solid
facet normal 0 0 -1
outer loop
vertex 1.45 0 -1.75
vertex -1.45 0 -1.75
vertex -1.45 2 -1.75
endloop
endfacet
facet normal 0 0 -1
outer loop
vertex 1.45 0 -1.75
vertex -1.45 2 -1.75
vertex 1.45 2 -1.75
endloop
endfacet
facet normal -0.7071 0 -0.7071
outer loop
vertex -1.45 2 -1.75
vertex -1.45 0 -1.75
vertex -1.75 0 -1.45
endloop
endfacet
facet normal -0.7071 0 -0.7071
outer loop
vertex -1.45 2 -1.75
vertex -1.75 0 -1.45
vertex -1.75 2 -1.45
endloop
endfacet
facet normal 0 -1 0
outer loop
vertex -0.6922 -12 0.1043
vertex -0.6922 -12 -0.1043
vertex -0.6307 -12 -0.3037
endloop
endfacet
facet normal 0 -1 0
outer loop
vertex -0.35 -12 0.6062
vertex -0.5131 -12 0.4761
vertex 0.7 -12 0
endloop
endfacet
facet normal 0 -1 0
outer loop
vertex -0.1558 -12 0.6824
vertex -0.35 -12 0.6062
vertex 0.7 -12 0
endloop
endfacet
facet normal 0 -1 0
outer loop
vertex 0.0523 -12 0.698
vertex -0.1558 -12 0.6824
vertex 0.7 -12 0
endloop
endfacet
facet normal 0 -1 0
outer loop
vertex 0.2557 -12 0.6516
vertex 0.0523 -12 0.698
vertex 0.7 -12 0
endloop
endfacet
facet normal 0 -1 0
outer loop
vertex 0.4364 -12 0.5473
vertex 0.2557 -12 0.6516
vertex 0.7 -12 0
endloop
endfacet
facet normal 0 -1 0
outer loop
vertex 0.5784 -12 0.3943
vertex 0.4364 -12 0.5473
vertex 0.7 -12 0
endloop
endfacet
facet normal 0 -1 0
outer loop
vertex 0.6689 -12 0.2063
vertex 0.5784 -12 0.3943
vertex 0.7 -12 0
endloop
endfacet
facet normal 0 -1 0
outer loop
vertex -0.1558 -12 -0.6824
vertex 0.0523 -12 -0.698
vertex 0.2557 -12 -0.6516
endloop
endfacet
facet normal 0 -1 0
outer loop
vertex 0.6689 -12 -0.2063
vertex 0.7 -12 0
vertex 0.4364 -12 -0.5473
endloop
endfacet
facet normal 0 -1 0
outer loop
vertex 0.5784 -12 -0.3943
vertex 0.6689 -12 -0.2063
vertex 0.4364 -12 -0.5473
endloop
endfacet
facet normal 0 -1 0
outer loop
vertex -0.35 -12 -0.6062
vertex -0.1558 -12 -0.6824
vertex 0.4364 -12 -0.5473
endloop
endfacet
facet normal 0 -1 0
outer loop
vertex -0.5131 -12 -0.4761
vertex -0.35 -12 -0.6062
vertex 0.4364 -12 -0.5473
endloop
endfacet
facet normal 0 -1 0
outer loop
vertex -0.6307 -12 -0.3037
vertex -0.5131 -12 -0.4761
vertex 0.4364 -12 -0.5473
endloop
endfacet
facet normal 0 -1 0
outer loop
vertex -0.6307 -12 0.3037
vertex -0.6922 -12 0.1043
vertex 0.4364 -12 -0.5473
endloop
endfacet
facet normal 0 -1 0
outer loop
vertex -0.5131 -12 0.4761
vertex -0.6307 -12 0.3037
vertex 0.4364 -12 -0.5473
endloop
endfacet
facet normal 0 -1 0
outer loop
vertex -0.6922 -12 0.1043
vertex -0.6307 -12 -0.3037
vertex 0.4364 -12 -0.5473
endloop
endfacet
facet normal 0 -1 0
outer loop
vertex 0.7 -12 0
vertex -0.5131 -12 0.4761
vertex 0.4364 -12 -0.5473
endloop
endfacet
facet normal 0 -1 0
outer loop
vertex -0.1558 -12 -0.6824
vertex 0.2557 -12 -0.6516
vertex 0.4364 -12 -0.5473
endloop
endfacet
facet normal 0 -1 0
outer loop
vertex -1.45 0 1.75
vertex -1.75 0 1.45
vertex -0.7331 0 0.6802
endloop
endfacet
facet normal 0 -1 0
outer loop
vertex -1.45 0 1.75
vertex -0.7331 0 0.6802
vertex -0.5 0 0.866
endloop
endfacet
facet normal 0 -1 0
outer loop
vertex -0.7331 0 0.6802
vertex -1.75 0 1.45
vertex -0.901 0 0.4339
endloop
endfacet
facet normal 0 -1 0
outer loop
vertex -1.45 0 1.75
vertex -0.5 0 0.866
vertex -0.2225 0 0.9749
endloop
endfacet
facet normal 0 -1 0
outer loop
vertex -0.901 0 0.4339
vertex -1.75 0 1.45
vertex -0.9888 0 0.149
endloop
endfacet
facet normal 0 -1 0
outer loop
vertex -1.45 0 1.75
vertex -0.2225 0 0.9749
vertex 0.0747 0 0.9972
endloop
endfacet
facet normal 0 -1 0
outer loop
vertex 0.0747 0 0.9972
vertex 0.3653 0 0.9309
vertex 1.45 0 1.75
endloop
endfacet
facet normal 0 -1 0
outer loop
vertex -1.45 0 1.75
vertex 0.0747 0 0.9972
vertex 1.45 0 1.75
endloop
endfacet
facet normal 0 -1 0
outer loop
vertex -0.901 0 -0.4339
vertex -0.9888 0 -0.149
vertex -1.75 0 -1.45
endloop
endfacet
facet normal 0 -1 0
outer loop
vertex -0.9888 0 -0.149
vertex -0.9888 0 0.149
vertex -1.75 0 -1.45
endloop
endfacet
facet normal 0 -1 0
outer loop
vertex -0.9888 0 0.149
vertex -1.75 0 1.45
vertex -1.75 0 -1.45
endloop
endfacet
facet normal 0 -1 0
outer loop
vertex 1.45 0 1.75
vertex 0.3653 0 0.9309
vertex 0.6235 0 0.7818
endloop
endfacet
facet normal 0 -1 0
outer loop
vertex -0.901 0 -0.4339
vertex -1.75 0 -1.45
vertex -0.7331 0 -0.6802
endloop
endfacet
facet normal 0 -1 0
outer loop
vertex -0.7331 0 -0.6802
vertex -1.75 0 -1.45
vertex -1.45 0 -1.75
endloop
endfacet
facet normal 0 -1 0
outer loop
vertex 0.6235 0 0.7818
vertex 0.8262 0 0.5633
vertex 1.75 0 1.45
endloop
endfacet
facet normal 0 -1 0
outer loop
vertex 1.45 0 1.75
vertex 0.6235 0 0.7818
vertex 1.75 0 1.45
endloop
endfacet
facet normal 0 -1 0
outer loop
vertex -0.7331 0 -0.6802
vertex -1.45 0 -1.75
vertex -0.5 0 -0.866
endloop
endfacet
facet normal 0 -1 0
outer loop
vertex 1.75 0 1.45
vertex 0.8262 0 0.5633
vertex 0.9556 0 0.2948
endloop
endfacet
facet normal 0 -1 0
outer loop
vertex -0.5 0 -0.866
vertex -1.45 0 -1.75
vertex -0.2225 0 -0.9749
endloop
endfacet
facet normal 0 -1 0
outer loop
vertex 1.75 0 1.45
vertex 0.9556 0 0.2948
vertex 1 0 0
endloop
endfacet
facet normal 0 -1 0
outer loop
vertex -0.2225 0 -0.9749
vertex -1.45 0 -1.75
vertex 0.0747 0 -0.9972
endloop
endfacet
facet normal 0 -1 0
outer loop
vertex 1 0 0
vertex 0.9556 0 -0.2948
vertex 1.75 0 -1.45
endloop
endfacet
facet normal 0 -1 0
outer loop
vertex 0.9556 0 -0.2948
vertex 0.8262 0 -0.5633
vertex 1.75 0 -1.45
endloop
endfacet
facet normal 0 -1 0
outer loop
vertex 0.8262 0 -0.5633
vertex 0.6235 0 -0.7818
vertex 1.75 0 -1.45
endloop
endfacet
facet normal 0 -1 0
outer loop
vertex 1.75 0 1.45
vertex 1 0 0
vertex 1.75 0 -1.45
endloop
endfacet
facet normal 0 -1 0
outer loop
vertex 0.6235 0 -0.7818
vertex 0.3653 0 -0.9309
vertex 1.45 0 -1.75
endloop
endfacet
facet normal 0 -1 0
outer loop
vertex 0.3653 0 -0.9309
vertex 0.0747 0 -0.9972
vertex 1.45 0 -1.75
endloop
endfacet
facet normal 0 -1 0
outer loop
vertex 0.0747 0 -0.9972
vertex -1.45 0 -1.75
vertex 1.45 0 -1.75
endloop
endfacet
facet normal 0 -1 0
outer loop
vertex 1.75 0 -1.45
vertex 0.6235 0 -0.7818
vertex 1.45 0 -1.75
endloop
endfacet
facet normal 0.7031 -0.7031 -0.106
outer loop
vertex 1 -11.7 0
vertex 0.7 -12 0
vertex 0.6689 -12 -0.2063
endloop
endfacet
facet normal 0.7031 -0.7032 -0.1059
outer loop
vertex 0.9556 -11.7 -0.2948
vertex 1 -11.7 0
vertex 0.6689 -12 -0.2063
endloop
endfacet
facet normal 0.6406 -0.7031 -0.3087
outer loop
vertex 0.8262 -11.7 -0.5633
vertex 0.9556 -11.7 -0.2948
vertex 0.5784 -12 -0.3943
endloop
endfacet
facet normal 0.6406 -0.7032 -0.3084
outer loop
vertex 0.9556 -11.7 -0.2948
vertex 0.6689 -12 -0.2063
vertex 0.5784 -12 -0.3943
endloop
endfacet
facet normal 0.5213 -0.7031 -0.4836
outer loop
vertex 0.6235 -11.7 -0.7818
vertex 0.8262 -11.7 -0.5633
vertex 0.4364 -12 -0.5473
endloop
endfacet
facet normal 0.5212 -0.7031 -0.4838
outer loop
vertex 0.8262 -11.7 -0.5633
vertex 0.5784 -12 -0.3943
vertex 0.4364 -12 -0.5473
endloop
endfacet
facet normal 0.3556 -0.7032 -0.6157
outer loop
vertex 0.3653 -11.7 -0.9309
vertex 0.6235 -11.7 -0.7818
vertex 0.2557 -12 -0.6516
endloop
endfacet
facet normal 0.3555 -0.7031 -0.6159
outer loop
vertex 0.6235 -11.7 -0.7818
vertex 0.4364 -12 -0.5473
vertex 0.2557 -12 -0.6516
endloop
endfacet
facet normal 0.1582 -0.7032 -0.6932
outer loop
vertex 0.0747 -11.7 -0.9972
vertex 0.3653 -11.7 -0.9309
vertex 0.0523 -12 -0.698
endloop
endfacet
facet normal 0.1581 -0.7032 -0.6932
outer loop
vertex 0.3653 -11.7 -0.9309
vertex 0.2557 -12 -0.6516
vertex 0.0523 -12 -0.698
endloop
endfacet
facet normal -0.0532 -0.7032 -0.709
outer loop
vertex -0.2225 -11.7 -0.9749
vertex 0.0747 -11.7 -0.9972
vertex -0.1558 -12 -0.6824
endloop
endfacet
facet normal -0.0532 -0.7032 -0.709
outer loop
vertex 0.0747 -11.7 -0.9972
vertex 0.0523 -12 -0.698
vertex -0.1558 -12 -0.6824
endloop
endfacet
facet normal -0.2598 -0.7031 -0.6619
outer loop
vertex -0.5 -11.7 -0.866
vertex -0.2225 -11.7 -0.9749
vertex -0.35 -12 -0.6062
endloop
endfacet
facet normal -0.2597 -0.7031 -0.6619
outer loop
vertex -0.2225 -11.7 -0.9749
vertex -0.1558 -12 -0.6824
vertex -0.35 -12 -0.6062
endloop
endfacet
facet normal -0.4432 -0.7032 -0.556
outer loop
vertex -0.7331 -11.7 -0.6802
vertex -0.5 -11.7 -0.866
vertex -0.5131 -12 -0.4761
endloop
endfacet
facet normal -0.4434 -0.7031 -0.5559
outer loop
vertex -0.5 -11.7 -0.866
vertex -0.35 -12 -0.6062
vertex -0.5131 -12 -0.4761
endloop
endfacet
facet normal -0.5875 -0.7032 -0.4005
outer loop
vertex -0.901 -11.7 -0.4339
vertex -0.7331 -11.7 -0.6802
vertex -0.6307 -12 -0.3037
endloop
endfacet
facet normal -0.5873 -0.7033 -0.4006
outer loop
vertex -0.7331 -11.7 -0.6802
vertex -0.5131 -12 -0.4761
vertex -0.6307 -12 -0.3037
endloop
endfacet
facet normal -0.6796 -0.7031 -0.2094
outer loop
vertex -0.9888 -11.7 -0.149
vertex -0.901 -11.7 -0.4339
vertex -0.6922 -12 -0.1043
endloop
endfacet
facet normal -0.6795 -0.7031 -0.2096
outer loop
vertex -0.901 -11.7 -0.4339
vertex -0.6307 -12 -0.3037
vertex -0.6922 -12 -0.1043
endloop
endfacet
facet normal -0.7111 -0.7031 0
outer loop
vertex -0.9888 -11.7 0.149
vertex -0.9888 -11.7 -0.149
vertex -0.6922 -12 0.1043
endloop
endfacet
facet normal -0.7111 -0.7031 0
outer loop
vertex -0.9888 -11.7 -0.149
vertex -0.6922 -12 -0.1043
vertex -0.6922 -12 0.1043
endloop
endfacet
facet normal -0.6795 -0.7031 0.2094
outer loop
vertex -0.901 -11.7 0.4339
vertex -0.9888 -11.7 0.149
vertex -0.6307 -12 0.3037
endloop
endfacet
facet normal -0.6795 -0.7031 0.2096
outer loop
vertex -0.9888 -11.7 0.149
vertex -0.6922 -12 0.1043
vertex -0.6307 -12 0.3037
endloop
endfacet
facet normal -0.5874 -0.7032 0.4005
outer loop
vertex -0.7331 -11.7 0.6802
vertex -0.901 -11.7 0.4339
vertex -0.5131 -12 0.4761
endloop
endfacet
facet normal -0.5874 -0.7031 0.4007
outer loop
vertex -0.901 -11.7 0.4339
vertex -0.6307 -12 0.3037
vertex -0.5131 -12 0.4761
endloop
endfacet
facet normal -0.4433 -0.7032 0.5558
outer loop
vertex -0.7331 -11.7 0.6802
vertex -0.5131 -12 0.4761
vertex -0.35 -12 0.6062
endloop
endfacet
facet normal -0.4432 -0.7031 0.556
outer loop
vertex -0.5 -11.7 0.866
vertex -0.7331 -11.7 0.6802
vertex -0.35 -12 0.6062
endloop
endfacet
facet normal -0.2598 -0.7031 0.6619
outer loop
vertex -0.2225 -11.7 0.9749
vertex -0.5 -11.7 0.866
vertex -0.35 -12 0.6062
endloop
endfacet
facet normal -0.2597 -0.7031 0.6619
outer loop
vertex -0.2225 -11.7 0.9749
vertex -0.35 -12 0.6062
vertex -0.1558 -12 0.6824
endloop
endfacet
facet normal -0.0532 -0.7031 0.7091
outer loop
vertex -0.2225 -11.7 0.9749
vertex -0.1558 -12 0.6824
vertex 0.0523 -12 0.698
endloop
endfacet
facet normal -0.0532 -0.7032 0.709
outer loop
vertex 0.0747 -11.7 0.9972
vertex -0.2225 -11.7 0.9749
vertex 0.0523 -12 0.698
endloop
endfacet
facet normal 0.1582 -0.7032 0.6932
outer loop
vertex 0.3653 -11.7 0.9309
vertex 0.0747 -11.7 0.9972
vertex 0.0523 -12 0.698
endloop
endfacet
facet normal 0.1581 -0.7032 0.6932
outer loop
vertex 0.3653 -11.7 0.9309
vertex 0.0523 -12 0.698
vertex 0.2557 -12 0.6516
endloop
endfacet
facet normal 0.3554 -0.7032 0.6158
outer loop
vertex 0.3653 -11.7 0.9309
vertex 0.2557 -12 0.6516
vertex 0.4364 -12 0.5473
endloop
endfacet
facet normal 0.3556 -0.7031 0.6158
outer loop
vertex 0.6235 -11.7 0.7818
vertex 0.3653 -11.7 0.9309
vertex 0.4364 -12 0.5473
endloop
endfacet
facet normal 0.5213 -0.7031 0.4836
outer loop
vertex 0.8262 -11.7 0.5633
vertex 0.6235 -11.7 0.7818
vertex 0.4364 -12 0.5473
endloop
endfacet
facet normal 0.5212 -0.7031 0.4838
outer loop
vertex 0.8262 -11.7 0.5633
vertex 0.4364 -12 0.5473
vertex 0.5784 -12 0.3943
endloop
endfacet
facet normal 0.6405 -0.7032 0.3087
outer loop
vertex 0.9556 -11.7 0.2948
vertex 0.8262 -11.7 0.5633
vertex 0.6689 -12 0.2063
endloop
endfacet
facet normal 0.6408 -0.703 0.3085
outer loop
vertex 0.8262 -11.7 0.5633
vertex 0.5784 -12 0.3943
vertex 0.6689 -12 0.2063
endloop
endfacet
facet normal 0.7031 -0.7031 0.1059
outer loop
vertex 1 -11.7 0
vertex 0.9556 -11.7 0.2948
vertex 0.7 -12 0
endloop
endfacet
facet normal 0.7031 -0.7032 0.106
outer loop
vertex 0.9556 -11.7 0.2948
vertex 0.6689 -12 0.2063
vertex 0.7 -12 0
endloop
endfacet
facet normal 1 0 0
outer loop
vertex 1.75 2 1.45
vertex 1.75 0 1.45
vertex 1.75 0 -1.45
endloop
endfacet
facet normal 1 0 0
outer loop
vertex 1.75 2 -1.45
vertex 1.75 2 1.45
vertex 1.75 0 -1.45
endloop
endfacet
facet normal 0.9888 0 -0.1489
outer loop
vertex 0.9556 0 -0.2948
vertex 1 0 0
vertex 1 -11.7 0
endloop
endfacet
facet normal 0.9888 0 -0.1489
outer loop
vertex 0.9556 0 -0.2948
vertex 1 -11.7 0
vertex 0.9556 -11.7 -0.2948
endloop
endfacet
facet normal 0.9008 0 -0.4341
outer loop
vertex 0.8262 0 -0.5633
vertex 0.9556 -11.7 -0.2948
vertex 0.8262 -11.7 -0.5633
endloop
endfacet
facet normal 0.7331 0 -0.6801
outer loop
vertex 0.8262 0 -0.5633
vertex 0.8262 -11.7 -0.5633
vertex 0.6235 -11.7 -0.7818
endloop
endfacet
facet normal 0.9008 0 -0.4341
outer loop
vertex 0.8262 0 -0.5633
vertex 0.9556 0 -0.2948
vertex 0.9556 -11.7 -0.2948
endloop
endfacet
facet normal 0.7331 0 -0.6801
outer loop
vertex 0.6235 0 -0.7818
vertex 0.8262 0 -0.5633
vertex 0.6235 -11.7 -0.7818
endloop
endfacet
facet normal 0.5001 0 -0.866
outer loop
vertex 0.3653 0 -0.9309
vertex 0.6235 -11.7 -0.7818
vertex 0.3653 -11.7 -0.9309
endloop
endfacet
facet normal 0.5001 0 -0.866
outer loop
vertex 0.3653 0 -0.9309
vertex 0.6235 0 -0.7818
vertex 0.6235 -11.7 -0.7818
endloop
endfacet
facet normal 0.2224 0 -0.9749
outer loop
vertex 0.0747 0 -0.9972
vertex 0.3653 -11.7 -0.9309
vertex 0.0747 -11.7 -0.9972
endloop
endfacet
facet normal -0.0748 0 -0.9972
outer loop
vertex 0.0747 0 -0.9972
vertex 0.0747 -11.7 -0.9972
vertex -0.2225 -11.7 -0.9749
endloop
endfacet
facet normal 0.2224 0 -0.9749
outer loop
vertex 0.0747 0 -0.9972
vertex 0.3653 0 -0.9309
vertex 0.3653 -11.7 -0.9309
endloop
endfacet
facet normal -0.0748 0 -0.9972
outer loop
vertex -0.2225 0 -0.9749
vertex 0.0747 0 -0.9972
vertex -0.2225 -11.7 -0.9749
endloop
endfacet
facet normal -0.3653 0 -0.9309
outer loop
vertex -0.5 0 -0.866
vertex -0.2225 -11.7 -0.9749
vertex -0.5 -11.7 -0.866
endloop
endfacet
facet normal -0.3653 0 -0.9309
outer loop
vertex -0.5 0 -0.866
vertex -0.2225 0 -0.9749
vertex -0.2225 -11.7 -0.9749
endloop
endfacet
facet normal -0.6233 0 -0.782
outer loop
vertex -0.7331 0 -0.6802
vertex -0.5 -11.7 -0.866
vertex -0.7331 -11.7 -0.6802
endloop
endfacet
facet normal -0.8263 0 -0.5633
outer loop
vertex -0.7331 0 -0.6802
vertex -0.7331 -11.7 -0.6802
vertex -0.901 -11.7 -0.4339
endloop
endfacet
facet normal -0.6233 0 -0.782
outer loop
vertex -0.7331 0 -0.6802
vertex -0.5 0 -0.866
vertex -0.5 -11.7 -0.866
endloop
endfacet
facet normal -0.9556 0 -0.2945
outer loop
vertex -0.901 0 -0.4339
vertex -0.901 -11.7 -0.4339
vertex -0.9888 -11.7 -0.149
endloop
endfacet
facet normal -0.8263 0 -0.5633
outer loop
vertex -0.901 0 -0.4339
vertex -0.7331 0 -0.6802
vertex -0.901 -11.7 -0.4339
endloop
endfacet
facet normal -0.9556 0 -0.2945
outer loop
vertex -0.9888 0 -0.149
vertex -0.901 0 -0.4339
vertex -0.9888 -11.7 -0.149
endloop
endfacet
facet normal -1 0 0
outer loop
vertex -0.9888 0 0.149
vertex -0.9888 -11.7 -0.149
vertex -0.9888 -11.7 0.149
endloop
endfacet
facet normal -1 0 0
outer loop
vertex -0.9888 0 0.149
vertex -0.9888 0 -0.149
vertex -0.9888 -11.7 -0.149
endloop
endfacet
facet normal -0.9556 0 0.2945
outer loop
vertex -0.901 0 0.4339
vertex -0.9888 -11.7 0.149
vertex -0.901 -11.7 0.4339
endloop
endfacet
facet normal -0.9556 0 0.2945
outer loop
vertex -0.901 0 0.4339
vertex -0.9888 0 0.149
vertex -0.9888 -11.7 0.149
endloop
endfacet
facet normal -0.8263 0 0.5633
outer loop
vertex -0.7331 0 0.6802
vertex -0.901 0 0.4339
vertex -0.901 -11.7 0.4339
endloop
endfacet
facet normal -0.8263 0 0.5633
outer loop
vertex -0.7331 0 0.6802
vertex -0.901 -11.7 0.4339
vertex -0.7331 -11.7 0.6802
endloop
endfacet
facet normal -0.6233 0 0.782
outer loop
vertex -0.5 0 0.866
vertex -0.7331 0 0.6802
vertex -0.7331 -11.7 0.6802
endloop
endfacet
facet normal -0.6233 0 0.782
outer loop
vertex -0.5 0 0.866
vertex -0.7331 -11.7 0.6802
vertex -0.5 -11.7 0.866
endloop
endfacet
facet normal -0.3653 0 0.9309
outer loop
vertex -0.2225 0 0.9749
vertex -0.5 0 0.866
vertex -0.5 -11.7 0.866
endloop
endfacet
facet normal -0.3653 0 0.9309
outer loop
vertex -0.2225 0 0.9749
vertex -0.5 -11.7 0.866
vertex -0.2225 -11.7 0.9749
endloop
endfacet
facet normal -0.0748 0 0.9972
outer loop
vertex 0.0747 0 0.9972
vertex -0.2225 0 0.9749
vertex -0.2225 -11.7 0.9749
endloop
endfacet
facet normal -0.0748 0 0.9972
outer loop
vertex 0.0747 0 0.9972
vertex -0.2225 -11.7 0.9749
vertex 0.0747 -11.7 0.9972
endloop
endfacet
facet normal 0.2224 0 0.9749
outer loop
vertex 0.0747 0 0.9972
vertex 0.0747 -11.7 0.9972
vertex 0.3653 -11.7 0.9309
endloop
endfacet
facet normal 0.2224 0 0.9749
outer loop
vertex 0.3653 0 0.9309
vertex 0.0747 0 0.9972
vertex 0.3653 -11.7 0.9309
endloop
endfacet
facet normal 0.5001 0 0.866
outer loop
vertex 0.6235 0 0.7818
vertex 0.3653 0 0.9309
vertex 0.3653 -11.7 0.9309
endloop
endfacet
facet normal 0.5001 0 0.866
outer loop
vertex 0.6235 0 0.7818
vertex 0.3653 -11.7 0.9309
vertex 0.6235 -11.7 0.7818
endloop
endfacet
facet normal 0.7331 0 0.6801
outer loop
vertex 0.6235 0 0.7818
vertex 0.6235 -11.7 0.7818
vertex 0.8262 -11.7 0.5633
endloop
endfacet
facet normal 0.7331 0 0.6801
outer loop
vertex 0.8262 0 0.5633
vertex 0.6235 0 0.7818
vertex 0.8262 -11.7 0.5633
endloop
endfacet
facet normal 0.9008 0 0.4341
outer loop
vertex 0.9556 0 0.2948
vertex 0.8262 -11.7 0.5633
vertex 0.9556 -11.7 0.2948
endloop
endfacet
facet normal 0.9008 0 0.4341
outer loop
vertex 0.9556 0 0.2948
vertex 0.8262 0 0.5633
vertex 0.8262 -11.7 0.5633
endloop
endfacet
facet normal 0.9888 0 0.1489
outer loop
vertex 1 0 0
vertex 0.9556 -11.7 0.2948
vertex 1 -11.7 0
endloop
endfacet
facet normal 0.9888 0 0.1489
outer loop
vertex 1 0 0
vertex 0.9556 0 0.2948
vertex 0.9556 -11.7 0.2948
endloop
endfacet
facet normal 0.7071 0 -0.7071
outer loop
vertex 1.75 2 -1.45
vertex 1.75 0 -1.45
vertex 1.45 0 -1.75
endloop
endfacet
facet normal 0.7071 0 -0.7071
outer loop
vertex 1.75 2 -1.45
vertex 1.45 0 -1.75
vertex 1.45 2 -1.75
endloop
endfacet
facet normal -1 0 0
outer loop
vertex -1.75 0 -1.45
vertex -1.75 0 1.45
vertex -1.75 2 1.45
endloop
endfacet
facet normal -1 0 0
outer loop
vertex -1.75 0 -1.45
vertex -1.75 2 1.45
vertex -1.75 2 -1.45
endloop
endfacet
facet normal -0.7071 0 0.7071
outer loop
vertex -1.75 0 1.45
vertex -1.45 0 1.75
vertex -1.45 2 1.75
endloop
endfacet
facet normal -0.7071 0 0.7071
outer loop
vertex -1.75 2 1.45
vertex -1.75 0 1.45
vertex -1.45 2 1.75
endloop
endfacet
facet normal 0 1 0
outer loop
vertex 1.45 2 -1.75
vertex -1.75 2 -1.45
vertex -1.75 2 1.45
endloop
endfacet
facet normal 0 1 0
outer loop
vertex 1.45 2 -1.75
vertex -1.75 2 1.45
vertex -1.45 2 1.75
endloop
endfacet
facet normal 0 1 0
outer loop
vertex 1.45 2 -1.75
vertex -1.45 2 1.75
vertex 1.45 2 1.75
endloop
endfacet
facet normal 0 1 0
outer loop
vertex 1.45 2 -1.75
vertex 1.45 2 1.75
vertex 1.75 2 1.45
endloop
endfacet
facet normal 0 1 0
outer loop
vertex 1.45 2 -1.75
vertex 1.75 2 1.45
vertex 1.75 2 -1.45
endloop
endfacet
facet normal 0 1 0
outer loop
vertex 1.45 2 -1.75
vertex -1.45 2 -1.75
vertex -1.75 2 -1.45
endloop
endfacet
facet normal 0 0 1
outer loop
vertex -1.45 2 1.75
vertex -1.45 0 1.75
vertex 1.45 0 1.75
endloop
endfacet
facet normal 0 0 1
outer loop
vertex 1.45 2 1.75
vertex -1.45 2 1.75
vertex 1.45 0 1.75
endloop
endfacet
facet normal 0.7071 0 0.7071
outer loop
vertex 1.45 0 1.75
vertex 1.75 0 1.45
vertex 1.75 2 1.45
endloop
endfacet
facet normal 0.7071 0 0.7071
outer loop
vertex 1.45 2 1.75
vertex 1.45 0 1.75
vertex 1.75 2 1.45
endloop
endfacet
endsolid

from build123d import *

# Parameters (mm, degrees)
SKETCH1_W           = 3.5
SKETCH1_H           = 3.5
BOSS_EXTRUDE1_DEPTH = 2
SKETCH2_R           = 1
BOSS_EXTRUDE2_DEPTH = 12
CHAMFER1_SIZE       = 0.3


with BuildPart() as part:
    # Sketch1 → Boss-Extrude1 (new body)
    with BuildSketch(Plane(origin=(0, 0, 0), x_dir=(1, 0, 0), z_dir=(0, 1, 0))):
        Rectangle(SKETCH1_W, SKETCH1_H)
    extrude(amount=BOSS_EXTRUDE1_DEPTH)

    # Sketch2 → Boss-Extrude2 (add)
    with BuildSketch(Plane(origin=(0, 0, 0), x_dir=(1, 0, 0), z_dir=(0, 1, 0))):
        Circle(SKETCH2_R)
    extrude(amount=-BOSS_EXTRUDE2_DEPTH)

    # Chamfer1
    chamfer1_edges = [part.edges().sort_by_distance(p)[0] for p in [
        (-1, -12, 0),
        (-1.75, 1, -1.75),
        (1.75, 1, -1.75),
        (1.75, 1, 1.75),
        (-1.75, 1, 1.75),
    ]]
    chamfer(chamfer1_edges, length=CHAMFER1_SIZE)


solid = part.part
